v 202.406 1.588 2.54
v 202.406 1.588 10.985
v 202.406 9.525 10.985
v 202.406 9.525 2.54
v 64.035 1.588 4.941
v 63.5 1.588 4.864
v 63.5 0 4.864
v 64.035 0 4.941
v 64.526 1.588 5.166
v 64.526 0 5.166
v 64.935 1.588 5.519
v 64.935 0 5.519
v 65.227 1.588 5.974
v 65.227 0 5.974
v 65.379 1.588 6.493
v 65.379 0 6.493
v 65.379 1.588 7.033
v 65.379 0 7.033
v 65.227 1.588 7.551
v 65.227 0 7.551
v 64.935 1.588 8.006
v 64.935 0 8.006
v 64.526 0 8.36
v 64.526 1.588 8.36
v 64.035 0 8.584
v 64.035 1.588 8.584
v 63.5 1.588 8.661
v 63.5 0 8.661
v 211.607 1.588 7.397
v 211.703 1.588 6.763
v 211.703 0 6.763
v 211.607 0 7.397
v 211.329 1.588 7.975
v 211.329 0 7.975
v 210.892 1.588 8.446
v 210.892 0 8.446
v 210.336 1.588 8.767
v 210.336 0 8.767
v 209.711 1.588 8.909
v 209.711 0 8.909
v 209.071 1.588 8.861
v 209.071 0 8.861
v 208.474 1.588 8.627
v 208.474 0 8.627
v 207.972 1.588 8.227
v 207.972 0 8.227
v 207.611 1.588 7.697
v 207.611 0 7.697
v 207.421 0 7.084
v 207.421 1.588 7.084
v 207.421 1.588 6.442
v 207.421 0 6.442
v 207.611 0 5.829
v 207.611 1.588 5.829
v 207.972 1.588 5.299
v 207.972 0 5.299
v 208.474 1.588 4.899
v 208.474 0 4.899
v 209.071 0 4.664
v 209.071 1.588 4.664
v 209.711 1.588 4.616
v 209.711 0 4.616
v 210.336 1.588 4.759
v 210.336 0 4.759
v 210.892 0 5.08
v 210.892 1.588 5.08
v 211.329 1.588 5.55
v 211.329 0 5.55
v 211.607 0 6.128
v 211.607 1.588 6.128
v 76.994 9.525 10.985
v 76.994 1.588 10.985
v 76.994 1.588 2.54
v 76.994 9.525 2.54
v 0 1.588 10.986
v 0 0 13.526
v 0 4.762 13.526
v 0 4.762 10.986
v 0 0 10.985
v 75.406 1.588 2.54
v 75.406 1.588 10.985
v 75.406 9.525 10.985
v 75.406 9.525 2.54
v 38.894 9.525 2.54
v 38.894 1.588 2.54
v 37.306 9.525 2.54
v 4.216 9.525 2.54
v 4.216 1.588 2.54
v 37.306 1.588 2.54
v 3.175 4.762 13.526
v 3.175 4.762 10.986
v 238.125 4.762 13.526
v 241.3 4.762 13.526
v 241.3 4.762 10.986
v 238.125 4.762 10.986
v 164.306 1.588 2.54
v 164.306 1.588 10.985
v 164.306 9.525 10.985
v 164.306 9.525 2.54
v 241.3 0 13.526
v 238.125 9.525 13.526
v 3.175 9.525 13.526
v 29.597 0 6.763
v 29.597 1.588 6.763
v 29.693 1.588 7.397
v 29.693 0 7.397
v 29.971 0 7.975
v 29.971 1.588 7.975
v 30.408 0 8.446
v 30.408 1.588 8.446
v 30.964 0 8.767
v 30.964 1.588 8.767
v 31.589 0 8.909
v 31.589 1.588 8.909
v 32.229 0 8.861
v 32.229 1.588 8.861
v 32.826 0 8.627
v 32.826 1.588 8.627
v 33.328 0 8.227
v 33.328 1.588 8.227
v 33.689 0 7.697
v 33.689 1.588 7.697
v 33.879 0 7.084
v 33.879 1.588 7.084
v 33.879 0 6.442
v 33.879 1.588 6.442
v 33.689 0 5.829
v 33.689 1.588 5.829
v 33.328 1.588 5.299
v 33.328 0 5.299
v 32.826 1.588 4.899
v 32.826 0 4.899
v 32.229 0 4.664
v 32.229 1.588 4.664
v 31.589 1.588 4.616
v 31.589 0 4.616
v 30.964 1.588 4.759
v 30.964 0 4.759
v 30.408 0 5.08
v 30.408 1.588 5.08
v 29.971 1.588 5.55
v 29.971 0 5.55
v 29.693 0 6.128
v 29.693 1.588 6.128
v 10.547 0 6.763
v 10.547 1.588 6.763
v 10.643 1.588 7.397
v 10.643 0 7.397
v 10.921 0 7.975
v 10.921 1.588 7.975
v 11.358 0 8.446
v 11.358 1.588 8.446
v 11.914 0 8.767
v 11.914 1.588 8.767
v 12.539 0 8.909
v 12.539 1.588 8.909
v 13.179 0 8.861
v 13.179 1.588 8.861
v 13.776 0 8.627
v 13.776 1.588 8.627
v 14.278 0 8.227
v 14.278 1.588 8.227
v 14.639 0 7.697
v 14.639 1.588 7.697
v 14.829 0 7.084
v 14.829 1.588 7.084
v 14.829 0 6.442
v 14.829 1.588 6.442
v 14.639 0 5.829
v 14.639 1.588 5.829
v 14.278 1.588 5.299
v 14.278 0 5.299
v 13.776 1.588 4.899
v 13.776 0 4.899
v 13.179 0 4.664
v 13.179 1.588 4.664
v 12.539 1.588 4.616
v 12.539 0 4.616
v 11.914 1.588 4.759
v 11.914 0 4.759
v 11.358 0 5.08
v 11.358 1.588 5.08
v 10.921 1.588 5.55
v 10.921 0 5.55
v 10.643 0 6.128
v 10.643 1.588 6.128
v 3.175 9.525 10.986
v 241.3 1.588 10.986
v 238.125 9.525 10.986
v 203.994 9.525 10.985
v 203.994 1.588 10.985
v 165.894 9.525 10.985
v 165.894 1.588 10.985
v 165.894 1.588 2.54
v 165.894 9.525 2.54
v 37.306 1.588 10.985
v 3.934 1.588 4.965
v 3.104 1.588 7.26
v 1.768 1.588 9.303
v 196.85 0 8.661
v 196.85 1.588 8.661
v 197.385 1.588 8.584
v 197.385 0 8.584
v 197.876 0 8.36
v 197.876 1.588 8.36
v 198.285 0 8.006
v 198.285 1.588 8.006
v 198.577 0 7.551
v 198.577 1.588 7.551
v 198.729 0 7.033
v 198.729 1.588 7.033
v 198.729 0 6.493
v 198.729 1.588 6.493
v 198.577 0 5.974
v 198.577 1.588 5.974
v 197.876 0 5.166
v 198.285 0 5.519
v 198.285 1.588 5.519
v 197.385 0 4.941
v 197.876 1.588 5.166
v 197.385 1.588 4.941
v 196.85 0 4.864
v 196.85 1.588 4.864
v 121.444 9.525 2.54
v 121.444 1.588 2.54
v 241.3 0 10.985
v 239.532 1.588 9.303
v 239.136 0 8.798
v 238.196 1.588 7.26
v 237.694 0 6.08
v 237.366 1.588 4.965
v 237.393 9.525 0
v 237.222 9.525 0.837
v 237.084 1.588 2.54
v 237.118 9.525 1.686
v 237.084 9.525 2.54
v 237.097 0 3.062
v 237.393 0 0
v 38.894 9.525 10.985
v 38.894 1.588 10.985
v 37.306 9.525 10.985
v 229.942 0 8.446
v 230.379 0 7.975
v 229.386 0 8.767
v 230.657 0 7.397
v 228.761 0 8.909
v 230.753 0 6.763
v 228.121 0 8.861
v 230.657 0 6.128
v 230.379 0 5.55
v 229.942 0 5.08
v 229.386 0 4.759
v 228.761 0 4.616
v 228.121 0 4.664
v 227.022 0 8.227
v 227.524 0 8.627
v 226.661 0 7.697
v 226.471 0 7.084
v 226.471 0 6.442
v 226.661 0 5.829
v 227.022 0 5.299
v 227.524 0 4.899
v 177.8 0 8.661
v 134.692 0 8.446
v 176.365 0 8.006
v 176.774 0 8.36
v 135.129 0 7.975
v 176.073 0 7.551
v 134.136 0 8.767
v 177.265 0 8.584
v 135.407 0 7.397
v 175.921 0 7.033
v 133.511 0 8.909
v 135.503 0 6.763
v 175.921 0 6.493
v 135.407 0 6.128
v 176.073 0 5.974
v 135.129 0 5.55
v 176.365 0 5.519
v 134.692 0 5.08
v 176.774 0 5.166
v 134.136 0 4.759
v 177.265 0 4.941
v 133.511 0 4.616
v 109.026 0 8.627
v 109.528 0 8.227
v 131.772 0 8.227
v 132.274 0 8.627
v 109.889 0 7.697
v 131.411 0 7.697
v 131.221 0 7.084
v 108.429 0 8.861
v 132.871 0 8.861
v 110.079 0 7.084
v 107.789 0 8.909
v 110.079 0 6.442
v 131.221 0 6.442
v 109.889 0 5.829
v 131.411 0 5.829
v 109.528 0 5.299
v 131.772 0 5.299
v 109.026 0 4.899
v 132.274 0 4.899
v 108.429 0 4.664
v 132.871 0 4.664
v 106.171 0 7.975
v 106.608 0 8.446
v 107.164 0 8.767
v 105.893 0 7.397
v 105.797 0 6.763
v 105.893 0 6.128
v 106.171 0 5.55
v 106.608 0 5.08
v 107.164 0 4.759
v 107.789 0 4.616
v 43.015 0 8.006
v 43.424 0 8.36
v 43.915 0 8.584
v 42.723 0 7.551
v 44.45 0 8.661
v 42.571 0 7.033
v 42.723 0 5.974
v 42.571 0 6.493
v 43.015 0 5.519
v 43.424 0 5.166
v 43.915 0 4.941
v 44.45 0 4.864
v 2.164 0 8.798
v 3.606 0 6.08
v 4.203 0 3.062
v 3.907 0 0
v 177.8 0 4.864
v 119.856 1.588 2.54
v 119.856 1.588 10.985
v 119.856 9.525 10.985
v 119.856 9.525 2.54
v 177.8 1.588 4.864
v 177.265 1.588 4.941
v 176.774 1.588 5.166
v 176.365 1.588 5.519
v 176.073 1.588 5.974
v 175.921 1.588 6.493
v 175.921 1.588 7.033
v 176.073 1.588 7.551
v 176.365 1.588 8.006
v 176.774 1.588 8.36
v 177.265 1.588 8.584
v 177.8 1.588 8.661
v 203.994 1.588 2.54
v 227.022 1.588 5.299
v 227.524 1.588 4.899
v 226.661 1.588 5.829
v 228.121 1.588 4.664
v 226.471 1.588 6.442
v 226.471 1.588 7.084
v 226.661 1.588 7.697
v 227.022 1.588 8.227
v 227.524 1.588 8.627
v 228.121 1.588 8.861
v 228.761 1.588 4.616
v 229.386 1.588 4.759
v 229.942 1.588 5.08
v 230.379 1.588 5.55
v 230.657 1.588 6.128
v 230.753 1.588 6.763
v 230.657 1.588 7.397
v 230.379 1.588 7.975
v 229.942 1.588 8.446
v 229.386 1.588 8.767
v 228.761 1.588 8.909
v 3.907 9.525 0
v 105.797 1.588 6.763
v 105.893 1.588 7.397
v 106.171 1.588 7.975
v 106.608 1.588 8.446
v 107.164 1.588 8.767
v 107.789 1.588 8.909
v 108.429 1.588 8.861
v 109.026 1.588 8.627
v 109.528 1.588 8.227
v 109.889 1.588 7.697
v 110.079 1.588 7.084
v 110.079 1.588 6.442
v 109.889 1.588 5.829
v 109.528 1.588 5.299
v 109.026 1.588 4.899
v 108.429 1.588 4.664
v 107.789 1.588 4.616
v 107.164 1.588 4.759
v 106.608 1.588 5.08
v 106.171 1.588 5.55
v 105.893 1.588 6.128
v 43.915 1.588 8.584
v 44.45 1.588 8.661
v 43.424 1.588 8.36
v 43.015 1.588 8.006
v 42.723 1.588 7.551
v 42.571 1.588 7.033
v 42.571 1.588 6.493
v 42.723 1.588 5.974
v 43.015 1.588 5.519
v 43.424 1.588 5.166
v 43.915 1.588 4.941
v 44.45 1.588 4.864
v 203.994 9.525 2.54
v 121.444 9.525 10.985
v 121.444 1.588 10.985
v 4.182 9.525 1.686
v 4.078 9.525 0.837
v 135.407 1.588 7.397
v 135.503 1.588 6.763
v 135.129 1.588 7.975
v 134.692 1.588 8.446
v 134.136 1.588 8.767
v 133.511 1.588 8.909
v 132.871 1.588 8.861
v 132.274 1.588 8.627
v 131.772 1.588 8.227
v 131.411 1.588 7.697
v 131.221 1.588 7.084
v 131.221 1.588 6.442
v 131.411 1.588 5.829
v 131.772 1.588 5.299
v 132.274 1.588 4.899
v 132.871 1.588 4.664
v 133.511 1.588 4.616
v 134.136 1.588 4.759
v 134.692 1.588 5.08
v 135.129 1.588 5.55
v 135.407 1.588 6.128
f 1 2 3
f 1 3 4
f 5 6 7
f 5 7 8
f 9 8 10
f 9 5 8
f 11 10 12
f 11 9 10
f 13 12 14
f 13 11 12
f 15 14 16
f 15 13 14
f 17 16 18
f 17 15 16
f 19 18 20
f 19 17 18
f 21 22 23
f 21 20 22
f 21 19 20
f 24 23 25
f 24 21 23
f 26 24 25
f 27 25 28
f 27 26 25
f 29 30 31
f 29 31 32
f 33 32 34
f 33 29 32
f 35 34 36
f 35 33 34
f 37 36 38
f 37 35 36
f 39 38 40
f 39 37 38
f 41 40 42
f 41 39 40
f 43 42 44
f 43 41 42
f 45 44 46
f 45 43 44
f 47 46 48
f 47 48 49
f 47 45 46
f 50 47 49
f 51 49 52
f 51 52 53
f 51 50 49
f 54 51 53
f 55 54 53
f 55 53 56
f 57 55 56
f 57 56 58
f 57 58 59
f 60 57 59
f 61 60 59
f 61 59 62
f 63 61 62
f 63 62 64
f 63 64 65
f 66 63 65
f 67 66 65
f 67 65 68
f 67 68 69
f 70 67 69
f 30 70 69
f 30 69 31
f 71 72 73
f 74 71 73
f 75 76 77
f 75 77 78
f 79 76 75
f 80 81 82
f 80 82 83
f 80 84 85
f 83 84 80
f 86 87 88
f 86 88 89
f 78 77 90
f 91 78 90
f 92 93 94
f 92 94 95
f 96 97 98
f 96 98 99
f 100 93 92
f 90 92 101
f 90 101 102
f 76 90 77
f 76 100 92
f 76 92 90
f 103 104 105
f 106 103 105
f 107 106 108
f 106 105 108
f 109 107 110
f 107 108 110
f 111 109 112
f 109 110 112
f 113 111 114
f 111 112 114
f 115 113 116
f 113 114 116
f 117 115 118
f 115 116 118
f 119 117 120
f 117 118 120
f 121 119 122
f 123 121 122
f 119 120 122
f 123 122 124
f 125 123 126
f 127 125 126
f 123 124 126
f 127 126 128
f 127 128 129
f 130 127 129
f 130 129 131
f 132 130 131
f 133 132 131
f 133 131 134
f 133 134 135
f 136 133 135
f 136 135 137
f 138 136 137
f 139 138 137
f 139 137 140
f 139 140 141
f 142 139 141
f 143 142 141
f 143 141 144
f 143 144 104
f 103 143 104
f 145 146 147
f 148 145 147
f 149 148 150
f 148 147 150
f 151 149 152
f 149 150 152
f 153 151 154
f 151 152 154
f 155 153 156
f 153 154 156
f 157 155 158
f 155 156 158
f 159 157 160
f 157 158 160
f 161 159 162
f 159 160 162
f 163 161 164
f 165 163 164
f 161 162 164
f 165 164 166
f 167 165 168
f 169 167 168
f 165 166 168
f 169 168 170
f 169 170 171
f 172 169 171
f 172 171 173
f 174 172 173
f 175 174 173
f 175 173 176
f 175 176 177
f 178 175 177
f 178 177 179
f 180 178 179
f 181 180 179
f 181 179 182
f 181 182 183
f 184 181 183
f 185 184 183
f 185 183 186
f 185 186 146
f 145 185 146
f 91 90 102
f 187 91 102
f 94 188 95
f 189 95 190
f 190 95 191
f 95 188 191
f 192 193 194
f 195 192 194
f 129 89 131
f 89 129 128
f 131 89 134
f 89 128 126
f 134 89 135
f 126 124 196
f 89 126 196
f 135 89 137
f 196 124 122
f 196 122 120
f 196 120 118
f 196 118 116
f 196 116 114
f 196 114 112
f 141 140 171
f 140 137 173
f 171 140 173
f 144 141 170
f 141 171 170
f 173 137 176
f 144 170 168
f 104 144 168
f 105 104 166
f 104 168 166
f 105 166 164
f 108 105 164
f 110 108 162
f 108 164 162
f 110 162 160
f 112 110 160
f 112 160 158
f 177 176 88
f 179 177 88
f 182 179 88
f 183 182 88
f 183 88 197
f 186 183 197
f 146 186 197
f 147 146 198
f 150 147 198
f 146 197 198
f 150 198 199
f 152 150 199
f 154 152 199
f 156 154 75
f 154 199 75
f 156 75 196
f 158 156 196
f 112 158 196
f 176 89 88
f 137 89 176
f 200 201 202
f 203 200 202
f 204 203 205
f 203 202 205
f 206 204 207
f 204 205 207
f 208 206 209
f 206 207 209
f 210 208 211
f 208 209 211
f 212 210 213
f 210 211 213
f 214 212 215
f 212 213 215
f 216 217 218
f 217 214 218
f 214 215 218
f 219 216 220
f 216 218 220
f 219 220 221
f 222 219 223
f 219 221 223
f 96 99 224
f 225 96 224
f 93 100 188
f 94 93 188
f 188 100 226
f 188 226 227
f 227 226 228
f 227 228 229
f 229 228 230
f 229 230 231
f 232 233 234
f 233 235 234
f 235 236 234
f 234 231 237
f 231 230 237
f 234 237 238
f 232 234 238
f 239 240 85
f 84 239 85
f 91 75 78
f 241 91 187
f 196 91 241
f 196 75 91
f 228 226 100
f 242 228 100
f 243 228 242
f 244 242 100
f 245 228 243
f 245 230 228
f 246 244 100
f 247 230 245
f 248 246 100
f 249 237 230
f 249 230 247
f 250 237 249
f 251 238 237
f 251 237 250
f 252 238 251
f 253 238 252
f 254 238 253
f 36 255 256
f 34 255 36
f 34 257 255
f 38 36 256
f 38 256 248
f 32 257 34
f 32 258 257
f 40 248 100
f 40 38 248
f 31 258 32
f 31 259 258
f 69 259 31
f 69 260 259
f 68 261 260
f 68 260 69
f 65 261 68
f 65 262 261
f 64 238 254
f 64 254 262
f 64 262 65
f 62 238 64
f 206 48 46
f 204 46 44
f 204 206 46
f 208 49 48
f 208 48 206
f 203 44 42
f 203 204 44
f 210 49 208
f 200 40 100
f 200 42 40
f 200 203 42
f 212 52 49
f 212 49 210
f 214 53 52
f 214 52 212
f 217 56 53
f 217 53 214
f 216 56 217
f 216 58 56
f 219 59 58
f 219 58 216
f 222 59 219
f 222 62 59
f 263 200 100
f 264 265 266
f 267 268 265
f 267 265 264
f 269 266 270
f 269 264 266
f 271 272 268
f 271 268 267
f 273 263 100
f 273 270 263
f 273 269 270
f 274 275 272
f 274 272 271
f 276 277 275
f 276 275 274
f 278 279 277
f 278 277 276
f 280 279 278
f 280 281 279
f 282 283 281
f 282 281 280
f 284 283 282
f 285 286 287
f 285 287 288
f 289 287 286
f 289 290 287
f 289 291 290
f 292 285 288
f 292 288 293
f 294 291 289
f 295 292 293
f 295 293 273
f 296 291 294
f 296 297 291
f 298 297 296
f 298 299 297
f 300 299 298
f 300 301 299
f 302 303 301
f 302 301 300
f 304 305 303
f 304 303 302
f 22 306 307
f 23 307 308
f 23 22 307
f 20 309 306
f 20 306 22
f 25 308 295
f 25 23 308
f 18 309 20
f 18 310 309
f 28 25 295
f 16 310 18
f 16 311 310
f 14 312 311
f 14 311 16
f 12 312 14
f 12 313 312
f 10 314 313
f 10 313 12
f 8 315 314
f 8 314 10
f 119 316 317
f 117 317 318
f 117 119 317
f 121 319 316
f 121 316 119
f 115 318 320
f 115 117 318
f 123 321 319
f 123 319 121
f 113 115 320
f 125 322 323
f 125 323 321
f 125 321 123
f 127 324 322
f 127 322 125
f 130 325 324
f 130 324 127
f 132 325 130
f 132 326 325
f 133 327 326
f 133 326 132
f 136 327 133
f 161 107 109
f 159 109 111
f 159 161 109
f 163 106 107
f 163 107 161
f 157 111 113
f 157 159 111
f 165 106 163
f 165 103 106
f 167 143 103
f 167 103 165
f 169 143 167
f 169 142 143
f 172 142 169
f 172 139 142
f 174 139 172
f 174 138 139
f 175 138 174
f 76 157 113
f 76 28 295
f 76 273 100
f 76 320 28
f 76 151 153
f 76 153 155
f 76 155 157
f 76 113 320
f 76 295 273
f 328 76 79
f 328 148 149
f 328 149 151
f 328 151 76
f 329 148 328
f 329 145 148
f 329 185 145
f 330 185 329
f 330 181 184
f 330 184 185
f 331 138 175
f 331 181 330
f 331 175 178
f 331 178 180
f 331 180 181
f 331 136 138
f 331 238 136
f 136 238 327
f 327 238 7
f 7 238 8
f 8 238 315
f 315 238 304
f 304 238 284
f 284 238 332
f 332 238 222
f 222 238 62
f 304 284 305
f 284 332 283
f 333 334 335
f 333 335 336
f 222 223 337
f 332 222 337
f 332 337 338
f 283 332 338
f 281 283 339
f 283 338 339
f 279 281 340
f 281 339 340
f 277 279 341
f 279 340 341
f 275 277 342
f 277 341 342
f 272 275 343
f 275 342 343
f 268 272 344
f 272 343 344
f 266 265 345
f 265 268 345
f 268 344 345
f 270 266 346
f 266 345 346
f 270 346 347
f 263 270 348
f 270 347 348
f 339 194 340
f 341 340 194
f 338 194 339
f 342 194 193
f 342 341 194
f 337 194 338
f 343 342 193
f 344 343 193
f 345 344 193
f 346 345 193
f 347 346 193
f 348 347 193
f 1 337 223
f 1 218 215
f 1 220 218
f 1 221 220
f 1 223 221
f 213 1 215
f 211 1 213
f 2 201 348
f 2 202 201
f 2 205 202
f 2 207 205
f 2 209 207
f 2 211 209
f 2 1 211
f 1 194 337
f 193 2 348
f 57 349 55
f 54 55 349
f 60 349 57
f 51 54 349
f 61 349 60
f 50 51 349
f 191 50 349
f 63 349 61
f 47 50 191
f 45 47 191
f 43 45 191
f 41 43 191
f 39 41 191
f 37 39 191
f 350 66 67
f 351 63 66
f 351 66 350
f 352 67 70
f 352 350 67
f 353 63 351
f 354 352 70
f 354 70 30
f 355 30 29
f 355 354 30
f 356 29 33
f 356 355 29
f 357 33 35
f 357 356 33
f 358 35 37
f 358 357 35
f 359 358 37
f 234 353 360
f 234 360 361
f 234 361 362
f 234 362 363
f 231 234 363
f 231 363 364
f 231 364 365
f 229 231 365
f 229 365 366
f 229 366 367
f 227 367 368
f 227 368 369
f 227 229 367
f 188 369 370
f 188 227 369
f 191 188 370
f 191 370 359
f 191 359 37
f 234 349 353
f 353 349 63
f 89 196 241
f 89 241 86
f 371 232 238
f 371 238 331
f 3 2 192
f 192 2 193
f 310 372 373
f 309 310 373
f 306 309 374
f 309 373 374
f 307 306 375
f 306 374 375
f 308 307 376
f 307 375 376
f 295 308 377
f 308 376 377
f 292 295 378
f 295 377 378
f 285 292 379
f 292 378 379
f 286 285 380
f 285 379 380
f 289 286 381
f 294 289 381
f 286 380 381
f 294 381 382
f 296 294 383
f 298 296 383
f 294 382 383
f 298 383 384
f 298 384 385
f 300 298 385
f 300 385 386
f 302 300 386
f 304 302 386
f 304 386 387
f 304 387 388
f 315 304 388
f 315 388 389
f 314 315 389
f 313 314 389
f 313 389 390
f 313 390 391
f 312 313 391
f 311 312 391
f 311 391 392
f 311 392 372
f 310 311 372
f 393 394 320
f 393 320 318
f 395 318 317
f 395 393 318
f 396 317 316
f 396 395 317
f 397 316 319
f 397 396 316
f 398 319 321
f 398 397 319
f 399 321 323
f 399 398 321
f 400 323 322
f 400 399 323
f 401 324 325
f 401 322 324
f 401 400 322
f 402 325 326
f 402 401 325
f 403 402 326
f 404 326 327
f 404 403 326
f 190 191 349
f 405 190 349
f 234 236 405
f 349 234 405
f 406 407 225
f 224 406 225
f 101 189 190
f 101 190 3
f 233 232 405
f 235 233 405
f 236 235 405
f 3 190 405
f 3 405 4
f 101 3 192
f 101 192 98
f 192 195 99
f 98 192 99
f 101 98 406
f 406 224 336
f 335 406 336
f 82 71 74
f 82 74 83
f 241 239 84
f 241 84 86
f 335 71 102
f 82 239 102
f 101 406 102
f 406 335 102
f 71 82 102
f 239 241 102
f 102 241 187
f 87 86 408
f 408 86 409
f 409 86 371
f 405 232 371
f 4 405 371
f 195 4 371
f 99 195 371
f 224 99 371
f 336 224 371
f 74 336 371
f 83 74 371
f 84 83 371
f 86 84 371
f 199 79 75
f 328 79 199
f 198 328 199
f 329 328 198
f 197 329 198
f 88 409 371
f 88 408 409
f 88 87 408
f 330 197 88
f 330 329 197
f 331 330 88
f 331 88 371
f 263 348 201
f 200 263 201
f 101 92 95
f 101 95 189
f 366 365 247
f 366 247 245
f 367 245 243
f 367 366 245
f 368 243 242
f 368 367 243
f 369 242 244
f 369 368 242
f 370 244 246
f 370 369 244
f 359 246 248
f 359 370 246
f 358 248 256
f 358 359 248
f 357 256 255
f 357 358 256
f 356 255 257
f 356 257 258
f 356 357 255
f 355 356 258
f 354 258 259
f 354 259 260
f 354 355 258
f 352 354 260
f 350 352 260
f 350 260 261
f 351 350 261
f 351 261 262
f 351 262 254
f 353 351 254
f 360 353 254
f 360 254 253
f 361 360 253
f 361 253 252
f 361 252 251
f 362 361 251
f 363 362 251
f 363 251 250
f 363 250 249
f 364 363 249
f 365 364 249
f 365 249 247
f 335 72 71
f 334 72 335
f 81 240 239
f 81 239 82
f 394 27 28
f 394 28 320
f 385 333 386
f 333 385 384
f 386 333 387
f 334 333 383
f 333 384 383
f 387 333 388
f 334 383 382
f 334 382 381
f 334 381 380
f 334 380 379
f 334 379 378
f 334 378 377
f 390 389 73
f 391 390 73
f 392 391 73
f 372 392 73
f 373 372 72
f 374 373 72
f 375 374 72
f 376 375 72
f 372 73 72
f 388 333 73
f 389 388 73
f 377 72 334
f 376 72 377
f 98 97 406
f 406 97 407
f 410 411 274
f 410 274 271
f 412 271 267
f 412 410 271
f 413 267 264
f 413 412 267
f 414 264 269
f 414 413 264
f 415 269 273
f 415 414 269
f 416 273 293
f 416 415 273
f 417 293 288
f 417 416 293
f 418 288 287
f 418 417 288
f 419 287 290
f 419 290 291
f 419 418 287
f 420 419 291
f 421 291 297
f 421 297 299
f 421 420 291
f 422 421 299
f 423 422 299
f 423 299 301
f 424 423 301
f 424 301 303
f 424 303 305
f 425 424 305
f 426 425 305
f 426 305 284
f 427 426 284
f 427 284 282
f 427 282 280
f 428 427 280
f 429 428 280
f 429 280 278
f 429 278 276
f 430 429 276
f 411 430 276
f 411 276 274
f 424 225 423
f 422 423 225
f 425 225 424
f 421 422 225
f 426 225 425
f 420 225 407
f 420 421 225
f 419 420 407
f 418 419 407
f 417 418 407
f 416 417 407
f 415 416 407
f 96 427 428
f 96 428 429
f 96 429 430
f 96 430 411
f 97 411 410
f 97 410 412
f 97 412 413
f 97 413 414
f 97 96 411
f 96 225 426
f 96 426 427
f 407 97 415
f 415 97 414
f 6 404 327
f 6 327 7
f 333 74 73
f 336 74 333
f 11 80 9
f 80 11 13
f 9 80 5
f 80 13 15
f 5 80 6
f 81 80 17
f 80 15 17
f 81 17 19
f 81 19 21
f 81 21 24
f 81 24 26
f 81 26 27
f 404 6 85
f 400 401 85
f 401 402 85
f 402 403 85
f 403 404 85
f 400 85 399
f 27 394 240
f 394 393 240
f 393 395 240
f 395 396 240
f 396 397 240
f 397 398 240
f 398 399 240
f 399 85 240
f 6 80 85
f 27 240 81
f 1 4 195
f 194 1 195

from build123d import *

# Parameters (mm, degrees)
SKETCH2_W               = 120.65
SKETCH2_H               = 9.525
BOSS_EXTRUDE1_DEPTH     = 2.54
SKETCH4_W               = 13.5255
SKETCH4_H               = 1.5875
BOSS_EXTRUDE2_DEPTH     = 120.65
SKETCH13_W              = 120.65
SKETCH13_H              = 2.54
BOSS_EXTRUDE3_DEPTH     = 7.9375
CUT_EXTRUDE4_DEPTH      = 122.664972595
F_6_CLEARANCE_HOLE1_D   = 4.3053
SKETCH15_W              = 1.5875
SKETCH15_H              = 8.4455
SKETCH15_W_2            = 0.79375
BOSS_EXTRUDE4_DEPTH     = 7.9375
CUT_EXTRUDE3_DEPTH      = 122.778845763
CUT_EXTRUDE3_DEPTH_BACK = 122.778845763
SKETCH9_R               = 10.566407632
CUT_EXTRUDE5_REACH      = 123.779
SKETCH16_W              = 3.175
SKETCH16_H              = 4.7625


with BuildPart() as part:
    # Sketch2 → Boss-Extrude1 (new body)
    with BuildSketch(Plane.XY):
        with Locations((60.325, 4.7625)):
            Rectangle(SKETCH2_W, SKETCH2_H)
    extrude(amount=BOSS_EXTRUDE1_DEPTH)

    # Sketch4 → Boss-Extrude2 (add)
    with BuildSketch(Plane.ZY):
        with Locations((6.76275, 0.79375)):
            Rectangle(SKETCH4_W, SKETCH4_H)
    extrude(amount=-BOSS_EXTRUDE2_DEPTH)

    # Sketch13 → Boss-Extrude3 (add)
    with BuildSketch(Plane(origin=(0, 1.5875, 0), x_dir=(1, 0, 0), z_dir=(0, 1, 0))):
        with Locations((60.325, -12.2555)):
            Rectangle(SKETCH13_W, SKETCH13_H)
    extrude(amount=BOSS_EXTRUDE3_DEPTH)

    # Sketch11 → Cut-Extrude4 (cut, through all)
    with BuildSketch(Plane(origin=(0, 1.5875, 0), x_dir=(1, 0, 0), z_dir=(0, 1, 0))):
        with BuildLine():
            Line((63.5, -8.6614), (44.45, -8.6614))
            ThreePointArc((44.45, -8.6614), (42.55135, -6.76275), (44.45, -4.8641))
            Line((44.45, -4.8641), (63.5, -4.8641))
            ThreePointArc((63.5, -4.8641), (65.39865, -6.76275), (63.5, -8.6614))
        make_face()
    extrude(amount=-CUT_EXTRUDE4_DEPTH, mode=Mode.SUBTRACT)

    # #6 Clearance Hole1 (through all)
    with Locations(Plane.XZ):
        with Locations((31.75, 6.76275), (12.7, 6.76275), (107.95, 6.76275)):
            Hole(F_6_CLEARANCE_HOLE1_D / 2)

    # Sketch15 → Boss-Extrude4 (add)
    with BuildSketch(Plane(origin=(0, 1.5875, 0), x_dir=(1, 0, 0), z_dir=(0, 1, 0))):
        with Locations((38.1, -6.76275)):
            Rectangle(SKETCH15_W, SKETCH15_H)
        with Locations((76.2, -6.76275)):
            Rectangle(SKETCH15_W, SKETCH15_H)
        with Locations((120.253125, -6.76275)):
            Rectangle(SKETCH15_W_2, SKETCH15_H)
    extrude(amount=BOSS_EXTRUDE4_DEPTH)

    # Sketch9 → Cut-Extrude3 (cut, two sides: drawn at the far end of the back side and taken through both)
    with BuildSketch(Plane(origin=(0, 0, 0), x_dir=(1, 0, 0), z_dir=(0, 1, 0)).offset(-CUT_EXTRUDE3_DEPTH_BACK)):
        with Locations((-6.35, -2.54)):
            Circle(SKETCH9_R)
    extrude(amount=CUT_EXTRUDE3_DEPTH + CUT_EXTRUDE3_DEPTH_BACK, mode=Mode.SUBTRACT)

    # Sketch16 → Cut-Extrude5 (cut, up to next)
    with BuildSketch(Plane.XY.offset(13.5255), mode=Mode.PRIVATE) as cut_extrude5_sk1:
        with Locations((1.5875, 7.14375)):
            Rectangle(SKETCH16_W, SKETCH16_H)
    cut_extrude5_tool1 = extrude(cut_extrude5_sk1.sketch, amount=-CUT_EXTRUDE5_REACH, mode=Mode.PRIVATE) & part.part
    add(cut_extrude5_tool1.solids().sort_by_distance((1.5875, 7.14375, 13.5255))[0], mode=Mode.SUBTRACT)

    # Mirror1: part across face


with BuildPart() as part_1:
    add(part.part)
    add(part.part.mirror(Plane(origin=(120.65, 4.7625, 6.76275), x_dir=(0, 0, 1), z_dir=(1, 0, 0))))


solid = part_1.part
